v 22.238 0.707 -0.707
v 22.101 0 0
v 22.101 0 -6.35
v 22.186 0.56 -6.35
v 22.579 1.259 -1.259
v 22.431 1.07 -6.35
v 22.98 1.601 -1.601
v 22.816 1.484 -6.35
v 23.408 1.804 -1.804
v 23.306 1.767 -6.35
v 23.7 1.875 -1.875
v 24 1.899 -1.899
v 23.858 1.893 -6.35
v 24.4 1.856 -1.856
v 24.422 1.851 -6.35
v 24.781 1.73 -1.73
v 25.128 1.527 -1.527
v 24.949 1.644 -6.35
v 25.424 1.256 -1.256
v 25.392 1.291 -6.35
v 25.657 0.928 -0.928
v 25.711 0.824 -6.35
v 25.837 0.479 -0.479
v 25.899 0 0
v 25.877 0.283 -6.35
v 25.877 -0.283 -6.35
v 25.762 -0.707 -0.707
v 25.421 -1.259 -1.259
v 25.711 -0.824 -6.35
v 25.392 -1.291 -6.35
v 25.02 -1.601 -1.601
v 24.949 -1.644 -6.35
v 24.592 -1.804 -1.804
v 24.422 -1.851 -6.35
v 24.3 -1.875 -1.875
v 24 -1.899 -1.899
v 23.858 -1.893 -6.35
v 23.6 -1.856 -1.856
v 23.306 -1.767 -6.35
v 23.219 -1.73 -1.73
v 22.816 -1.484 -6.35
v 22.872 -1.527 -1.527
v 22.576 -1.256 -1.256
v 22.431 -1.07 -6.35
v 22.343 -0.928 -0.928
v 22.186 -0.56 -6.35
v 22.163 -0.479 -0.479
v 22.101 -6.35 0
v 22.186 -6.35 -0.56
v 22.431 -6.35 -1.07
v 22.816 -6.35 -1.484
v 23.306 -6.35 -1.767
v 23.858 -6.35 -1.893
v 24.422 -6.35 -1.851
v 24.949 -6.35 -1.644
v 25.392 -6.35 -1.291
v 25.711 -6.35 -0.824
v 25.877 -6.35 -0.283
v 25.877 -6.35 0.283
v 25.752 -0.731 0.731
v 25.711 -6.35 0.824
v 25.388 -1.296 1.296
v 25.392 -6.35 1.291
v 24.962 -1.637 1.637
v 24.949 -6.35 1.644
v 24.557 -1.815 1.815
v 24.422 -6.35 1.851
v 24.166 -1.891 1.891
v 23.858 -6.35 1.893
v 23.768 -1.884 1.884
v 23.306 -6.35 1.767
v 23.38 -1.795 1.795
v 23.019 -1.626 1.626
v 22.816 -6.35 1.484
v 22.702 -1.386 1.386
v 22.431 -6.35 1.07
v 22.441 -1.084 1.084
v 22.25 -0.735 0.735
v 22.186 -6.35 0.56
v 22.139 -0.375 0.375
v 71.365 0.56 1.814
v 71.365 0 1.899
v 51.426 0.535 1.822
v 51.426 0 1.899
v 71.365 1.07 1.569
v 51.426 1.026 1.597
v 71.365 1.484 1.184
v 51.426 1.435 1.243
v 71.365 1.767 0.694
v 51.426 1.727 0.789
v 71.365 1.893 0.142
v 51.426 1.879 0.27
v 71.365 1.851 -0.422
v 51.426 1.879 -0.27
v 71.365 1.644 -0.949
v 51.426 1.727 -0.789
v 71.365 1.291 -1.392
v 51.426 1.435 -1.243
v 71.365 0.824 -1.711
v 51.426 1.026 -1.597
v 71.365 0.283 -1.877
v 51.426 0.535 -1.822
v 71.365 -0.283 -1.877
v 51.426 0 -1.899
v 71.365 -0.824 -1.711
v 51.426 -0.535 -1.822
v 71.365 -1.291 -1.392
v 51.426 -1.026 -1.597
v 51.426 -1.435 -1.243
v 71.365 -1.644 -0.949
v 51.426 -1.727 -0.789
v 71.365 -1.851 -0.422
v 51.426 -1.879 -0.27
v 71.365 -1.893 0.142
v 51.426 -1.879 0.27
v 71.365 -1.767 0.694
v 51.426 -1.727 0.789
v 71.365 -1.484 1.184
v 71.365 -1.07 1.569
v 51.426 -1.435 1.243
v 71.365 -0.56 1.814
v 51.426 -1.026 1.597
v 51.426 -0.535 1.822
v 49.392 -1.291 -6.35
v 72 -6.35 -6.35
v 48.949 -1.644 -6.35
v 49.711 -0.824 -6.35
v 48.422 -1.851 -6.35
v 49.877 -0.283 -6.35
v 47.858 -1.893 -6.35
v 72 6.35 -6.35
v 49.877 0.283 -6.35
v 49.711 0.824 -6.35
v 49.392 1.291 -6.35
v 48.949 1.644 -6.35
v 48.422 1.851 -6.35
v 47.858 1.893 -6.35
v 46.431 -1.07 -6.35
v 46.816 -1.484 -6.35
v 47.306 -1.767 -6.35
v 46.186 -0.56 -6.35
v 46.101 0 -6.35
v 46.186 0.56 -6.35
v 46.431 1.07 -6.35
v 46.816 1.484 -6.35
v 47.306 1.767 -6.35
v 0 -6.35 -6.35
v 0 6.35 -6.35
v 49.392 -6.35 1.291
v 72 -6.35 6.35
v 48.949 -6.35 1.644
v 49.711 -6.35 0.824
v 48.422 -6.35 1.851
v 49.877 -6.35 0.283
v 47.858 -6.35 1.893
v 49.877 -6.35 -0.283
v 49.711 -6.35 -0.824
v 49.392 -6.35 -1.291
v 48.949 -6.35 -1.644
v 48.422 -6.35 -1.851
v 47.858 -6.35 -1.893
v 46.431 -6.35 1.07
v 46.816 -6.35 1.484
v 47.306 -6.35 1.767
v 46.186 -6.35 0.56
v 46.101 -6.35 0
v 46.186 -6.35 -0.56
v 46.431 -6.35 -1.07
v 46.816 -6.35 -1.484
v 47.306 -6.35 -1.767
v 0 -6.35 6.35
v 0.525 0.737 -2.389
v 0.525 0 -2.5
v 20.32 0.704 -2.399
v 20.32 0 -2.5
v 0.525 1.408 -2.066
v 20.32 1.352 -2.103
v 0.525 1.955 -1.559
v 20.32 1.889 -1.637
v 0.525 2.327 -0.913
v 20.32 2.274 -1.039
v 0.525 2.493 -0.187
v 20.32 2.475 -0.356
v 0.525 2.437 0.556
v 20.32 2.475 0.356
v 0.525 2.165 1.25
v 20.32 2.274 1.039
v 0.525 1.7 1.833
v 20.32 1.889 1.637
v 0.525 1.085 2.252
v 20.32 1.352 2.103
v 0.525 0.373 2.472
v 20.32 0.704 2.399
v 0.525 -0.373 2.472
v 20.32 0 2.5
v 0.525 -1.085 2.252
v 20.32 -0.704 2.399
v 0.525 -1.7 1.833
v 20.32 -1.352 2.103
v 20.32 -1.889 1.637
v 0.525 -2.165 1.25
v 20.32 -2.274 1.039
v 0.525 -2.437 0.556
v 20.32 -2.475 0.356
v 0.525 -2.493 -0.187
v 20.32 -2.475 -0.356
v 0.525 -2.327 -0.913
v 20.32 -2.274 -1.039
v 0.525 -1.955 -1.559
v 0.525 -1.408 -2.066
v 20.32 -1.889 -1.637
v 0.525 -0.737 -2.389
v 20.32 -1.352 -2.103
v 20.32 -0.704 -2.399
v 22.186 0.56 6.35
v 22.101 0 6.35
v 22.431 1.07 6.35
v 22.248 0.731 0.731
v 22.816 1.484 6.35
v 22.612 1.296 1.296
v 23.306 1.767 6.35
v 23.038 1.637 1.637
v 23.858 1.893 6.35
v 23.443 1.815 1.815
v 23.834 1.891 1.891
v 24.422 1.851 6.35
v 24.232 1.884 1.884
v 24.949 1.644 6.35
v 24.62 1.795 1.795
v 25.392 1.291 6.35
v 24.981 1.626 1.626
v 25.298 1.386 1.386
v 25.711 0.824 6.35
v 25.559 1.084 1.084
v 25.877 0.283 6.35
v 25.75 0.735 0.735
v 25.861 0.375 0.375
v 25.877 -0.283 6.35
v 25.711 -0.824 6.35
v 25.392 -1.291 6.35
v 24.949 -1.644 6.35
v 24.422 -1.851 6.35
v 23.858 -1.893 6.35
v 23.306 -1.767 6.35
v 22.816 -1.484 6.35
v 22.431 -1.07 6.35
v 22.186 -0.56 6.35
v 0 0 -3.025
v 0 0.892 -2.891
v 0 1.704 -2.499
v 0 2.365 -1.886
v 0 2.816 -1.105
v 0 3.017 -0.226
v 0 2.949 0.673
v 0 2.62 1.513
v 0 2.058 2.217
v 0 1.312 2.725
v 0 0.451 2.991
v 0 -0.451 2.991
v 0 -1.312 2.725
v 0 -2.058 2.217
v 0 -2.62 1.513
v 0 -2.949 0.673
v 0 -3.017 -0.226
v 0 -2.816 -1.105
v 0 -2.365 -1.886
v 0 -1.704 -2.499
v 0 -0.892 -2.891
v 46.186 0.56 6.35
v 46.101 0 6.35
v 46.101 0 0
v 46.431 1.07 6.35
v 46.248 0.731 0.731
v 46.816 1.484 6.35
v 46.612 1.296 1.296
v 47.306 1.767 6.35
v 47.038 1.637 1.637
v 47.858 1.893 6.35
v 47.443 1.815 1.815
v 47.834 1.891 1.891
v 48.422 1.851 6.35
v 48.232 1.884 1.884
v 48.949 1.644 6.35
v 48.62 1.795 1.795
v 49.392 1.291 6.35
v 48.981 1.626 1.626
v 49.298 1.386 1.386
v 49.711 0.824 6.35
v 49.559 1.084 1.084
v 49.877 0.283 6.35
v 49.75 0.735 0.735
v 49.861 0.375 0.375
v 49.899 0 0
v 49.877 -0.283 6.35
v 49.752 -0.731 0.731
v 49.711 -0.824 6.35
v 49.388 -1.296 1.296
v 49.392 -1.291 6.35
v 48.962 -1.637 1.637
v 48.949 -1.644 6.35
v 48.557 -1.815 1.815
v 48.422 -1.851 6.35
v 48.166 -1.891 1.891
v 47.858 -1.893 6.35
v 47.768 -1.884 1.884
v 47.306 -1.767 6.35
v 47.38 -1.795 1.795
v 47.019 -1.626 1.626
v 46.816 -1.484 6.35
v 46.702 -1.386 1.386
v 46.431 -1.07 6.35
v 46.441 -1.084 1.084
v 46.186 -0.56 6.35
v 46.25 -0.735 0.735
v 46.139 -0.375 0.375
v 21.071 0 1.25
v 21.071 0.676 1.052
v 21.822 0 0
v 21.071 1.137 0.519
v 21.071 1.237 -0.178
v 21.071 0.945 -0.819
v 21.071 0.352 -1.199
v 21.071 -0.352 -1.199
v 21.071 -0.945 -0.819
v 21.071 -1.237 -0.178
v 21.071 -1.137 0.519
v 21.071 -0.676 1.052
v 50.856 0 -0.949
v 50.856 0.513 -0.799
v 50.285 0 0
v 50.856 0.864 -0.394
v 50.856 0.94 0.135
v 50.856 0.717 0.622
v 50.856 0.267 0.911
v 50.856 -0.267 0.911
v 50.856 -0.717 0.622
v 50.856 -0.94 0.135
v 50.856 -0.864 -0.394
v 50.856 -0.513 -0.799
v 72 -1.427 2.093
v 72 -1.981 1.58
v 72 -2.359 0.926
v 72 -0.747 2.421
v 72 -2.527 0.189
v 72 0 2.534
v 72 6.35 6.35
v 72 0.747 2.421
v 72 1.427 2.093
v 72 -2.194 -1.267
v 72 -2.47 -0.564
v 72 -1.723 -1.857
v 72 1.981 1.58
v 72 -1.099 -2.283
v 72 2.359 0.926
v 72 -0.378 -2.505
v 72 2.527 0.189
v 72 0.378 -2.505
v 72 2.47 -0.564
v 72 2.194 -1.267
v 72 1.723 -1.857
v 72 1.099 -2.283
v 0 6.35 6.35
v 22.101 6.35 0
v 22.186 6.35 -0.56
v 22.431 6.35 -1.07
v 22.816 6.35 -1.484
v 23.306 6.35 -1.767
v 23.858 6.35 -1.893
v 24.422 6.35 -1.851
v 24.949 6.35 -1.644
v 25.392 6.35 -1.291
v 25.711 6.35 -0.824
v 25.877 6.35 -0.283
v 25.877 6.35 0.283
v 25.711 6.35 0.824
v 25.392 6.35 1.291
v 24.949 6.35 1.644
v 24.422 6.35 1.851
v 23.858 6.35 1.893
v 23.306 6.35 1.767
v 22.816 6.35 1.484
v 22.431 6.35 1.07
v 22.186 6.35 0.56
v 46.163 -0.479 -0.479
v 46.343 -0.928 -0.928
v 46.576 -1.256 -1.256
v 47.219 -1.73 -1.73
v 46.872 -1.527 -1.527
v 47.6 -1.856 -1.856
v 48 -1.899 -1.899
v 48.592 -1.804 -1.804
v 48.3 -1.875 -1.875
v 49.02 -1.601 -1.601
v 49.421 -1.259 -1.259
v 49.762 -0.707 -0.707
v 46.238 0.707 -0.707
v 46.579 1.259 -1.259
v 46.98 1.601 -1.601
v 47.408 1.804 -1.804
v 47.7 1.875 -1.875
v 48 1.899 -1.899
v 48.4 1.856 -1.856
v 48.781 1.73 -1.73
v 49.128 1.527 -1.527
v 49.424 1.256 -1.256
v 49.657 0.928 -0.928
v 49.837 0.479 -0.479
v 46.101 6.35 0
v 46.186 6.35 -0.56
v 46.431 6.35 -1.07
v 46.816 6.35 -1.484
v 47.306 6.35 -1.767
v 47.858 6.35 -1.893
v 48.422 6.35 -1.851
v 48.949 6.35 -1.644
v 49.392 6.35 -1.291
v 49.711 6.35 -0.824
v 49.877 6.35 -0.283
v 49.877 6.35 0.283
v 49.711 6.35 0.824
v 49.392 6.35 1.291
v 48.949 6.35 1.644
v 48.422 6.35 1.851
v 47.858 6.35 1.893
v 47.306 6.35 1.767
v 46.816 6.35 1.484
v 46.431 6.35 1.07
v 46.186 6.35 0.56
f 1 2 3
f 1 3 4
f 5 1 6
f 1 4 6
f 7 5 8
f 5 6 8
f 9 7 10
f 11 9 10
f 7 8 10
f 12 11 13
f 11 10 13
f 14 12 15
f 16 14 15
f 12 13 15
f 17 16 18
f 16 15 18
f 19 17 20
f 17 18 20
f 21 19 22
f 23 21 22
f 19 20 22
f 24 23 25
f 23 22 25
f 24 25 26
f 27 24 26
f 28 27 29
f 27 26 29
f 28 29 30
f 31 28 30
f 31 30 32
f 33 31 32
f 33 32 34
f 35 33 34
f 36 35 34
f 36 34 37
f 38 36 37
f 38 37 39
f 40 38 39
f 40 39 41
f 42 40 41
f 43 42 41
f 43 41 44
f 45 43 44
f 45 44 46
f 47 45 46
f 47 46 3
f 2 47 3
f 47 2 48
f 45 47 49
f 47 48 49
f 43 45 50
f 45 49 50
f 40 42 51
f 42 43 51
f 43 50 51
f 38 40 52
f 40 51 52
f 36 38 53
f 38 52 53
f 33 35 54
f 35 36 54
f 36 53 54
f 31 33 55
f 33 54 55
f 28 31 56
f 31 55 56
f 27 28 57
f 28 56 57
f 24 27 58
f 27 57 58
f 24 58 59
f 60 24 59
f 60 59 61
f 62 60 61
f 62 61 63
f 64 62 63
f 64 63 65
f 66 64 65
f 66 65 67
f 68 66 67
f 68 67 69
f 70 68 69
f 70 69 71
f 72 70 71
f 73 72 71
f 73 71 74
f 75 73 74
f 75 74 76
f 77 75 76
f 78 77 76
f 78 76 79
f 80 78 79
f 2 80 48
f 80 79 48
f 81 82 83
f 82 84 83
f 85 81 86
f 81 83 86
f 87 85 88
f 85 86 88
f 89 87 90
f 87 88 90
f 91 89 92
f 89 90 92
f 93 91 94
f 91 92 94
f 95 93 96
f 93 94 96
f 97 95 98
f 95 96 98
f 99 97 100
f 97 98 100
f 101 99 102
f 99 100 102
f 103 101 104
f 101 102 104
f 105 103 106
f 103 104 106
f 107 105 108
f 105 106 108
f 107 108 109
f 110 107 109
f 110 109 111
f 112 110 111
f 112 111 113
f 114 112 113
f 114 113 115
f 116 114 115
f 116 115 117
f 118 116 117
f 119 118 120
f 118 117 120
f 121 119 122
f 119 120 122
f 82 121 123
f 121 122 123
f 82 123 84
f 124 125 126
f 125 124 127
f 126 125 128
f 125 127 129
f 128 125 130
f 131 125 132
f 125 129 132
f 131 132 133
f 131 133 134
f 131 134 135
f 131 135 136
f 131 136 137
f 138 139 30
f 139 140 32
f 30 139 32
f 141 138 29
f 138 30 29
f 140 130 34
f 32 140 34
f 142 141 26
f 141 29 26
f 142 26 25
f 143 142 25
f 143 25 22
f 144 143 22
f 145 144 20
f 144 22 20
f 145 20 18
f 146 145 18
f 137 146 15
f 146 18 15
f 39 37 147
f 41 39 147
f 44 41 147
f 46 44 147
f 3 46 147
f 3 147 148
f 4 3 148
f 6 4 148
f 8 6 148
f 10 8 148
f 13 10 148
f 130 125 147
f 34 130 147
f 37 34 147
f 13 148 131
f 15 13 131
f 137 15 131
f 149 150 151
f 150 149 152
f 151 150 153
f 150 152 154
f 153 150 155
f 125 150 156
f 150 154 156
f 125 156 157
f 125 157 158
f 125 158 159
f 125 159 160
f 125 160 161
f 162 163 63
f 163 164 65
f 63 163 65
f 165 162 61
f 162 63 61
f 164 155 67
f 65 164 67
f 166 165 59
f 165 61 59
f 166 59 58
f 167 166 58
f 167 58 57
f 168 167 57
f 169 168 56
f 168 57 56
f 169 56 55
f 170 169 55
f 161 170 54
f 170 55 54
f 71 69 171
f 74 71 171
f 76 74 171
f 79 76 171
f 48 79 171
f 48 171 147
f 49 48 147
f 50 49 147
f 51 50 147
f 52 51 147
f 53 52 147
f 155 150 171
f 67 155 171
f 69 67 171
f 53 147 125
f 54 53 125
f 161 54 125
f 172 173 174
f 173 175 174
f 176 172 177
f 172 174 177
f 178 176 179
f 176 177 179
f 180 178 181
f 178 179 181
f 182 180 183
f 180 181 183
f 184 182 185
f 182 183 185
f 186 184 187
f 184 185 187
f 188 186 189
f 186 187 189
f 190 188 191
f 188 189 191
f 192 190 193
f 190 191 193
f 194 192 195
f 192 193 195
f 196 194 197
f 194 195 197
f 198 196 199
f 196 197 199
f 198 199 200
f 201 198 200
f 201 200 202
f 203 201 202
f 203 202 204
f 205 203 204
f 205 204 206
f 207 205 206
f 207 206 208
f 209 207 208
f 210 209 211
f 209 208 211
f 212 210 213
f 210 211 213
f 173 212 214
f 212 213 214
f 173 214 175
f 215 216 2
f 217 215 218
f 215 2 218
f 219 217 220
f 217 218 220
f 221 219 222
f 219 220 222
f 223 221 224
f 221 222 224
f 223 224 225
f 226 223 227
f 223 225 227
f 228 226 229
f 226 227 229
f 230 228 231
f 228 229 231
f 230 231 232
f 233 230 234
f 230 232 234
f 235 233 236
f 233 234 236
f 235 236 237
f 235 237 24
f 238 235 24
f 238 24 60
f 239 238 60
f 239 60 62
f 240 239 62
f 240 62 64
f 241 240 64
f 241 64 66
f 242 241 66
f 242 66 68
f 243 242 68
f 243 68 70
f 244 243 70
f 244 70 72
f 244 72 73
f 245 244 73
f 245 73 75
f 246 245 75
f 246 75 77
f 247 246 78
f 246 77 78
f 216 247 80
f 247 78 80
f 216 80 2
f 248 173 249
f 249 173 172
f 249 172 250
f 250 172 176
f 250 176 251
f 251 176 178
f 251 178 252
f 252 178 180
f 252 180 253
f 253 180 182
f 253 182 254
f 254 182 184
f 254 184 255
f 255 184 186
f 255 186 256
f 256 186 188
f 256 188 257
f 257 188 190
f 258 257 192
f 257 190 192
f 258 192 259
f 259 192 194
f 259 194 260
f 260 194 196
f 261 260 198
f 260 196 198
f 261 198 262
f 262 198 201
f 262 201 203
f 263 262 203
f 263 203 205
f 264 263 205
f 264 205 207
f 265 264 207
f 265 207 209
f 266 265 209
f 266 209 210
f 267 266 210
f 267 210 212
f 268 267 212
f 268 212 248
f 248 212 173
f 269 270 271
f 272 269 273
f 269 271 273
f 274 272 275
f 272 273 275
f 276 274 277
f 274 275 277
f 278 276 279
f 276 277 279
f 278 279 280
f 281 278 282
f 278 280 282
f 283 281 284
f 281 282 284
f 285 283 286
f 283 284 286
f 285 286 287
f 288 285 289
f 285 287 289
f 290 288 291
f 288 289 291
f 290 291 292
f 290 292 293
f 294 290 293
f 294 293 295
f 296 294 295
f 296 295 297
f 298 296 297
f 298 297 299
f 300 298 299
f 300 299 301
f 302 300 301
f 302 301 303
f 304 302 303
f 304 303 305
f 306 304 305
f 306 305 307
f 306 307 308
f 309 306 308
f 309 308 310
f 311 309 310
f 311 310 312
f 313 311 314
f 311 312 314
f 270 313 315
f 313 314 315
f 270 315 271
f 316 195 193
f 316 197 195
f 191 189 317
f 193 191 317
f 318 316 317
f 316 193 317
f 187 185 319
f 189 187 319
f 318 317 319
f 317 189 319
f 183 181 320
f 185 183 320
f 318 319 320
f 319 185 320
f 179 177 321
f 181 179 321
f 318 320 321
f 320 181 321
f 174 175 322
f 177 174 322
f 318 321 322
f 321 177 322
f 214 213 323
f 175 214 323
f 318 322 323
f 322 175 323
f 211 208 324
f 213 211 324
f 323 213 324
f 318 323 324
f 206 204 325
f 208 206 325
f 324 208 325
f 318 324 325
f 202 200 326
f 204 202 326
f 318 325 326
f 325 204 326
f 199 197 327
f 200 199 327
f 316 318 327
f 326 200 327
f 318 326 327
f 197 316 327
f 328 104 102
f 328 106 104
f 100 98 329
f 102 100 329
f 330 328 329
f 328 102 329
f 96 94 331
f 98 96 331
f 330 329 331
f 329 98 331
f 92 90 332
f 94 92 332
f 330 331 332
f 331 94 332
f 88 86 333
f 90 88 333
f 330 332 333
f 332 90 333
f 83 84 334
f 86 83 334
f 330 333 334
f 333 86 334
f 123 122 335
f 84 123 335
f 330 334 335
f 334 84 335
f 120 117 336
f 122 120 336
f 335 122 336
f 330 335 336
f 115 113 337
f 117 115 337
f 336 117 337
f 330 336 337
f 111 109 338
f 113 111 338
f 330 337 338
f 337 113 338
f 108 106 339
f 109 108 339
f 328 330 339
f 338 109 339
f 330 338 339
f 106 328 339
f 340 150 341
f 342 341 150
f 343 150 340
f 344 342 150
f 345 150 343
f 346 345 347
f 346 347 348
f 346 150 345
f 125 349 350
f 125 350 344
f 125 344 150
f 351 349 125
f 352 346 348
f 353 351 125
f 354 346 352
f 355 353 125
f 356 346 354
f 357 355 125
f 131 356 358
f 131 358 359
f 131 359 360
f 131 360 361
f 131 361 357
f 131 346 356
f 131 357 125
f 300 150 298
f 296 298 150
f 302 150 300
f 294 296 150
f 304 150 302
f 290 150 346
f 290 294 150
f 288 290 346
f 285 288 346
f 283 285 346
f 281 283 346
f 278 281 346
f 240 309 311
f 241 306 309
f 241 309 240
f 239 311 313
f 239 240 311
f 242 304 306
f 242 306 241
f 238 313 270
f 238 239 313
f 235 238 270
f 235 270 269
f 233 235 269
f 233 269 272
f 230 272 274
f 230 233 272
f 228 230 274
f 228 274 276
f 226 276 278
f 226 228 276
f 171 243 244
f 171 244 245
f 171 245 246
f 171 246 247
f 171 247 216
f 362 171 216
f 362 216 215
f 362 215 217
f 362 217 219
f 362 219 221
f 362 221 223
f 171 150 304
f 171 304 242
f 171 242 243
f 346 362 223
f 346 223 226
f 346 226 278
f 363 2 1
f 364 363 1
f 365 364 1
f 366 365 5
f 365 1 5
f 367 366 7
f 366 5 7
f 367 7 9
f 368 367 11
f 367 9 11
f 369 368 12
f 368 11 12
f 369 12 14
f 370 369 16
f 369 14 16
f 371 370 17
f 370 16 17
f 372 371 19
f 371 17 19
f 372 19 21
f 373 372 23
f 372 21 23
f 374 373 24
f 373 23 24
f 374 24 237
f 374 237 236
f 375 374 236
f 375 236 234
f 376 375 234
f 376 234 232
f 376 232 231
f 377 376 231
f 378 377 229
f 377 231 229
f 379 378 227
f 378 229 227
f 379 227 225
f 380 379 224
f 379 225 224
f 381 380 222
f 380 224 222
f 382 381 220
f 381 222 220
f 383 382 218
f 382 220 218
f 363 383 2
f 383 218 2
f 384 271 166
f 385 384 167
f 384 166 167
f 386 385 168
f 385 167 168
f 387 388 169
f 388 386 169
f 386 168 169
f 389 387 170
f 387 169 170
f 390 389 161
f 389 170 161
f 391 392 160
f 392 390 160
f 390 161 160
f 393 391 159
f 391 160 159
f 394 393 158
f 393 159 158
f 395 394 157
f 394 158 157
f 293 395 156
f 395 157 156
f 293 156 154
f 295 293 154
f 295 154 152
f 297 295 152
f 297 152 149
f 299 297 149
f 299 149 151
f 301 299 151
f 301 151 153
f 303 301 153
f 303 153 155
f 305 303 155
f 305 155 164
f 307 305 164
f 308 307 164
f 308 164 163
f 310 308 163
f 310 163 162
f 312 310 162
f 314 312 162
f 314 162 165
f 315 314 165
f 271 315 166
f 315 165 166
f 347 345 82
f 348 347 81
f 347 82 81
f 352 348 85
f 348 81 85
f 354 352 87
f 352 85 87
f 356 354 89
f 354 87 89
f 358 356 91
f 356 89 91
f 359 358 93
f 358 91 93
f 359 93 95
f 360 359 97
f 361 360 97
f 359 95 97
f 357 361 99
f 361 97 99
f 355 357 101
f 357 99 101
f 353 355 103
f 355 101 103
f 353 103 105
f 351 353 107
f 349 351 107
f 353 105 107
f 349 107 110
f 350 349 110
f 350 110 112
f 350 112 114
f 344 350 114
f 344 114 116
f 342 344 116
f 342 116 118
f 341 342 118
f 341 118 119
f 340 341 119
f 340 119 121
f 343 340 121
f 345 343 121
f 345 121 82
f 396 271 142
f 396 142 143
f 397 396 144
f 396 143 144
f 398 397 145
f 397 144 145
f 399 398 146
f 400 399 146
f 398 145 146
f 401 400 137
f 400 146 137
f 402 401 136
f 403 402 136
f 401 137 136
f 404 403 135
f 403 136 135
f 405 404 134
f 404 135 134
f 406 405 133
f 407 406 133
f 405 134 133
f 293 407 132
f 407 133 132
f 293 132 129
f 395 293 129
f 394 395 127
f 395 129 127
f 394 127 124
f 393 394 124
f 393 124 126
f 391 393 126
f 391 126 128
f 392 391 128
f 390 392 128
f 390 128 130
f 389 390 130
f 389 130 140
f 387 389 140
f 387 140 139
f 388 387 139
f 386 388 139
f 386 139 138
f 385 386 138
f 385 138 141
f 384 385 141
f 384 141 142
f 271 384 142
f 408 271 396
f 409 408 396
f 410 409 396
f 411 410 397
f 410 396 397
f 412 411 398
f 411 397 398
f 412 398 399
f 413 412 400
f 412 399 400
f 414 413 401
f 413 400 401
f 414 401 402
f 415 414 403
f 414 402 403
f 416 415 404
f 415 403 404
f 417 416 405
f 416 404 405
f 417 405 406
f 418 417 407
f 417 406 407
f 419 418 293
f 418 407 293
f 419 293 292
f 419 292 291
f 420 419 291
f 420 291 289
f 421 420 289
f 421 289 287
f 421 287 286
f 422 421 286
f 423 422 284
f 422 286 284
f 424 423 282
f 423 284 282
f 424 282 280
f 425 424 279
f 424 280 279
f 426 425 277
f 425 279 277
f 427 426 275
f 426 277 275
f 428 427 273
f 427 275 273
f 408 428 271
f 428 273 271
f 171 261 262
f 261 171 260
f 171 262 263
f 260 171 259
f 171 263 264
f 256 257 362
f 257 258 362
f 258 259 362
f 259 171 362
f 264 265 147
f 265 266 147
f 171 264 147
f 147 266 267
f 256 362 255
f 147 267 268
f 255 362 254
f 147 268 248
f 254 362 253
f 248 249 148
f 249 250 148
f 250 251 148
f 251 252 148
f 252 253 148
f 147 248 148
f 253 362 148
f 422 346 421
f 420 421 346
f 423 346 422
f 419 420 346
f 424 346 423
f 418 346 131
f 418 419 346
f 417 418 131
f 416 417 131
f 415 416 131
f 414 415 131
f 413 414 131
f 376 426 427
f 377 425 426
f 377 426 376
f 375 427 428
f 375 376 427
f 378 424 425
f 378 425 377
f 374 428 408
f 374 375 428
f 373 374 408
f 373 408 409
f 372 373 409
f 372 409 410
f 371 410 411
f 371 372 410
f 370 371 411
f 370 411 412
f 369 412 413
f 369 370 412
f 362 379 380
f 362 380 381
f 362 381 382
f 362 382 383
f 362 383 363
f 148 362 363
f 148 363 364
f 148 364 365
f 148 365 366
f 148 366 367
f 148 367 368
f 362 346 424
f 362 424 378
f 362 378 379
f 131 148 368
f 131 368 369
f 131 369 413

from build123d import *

# Parameters (mm, degrees)
SKETCH1_W                        = 12.7
SKETCH1_H                        = 12.7
BOSS_EXTRUDE1_DEPTH              = 72
F_10_24_TAPPED_HOLE1_D           = 3.7973
F_10_24_TAPPED_HOLE2_D           = 3.7973
M6X1_0_TAPPED_HOLE2_D            = 5
M6X1_0_TAPPED_HOLE2_DEPTH        = 20.32
M6X1_0_TAPPED_HOLE2_CSINK_D      = 6.05
M6X1_0_TAPPED_HOLE2_CSINK_ANGLE  = 90
M6X1_0_TAPPED_HOLE2_TIP          = 1.502151548
F_10_24_TAPPED_HOLE3_D           = 3.7973
F_10_24_TAPPED_HOLE3_DEPTH       = 20.574
F_10_24_TAPPED_HOLE3_CSINK_D     = 5.0673
F_10_24_TAPPED_HOLE3_CSINK_ANGLE = 90
F_10_24_TAPPED_HOLE3_TIP         = 1.140824014
LPATTERN1_COUNT                  = 2
LPATTERN1_PITCH                  = 24
LPATTERN2_COUNT                  = 2
LPATTERN2_PITCH                  = 24


with BuildPart() as part:
    # Sketch1 → Boss-Extrude1 (new body)
    with BuildSketch(Plane(origin=(0, 0, 0), x_dir=(0, 0, -1), z_dir=(1, 0, 0))):
        Rectangle(SKETCH1_W, SKETCH1_H)
    extrude(amount=BOSS_EXTRUDE1_DEPTH)

    # #10-24 Tapped Hole1 (through all)
    with Locations(Plane.XY.offset(6.35)):
        with Locations((24, 0)):
            f_10_24_tapped_hole1 = Hole(F_10_24_TAPPED_HOLE1_D / 2)

    # #10-24 Tapped Hole2 (through all)
    with Locations(Plane(origin=(0, 6.35, 0), x_dir=(1, 0, 0), z_dir=(0, 1, 0))):
        with Locations((24, 0)):
            f_10_24_tapped_hole2 = Hole(F_10_24_TAPPED_HOLE2_D / 2)

    # M6x1.0 Tapped Hole2
    with Locations(Plane.ZY):
        with Locations((0, 0)):
            CounterSinkHole(M6X1_0_TAPPED_HOLE2_D / 2, M6X1_0_TAPPED_HOLE2_CSINK_D / 2, depth=M6X1_0_TAPPED_HOLE2_DEPTH, counter_sink_angle=M6X1_0_TAPPED_HOLE2_CSINK_ANGLE)
            with Locations((0, 0, -(M6X1_0_TAPPED_HOLE2_DEPTH + M6X1_0_TAPPED_HOLE2_TIP / 2))):  # 118° drill point
                Cone(0, M6X1_0_TAPPED_HOLE2_D / 2, M6X1_0_TAPPED_HOLE2_TIP, mode=Mode.SUBTRACT)

    # #10-24 Tapped Hole3
    with Locations(Plane(origin=(72, 0, 0), x_dir=(0, 0, -1), z_dir=(1, 0, 0))):
        with Locations((0, 0)):
            CounterSinkHole(F_10_24_TAPPED_HOLE3_D / 2, F_10_24_TAPPED_HOLE3_CSINK_D / 2, depth=F_10_24_TAPPED_HOLE3_DEPTH, counter_sink_angle=F_10_24_TAPPED_HOLE3_CSINK_ANGLE)
            with Locations((0, 0, -(F_10_24_TAPPED_HOLE3_DEPTH + F_10_24_TAPPED_HOLE3_TIP / 2))):  # 118° drill point
                Cone(0, F_10_24_TAPPED_HOLE3_D / 2, F_10_24_TAPPED_HOLE3_TIP, mode=Mode.SUBTRACT)

    # LPattern1: #10-24 Tapped Hole1 ×2
    with Locations(*[(i * LPATTERN1_PITCH, 0, 0) for i in range(1, LPATTERN1_COUNT)]):
        add(f_10_24_tapped_hole1, mode=Mode.SUBTRACT)

    # LPattern2: #10-24 Tapped Hole2 ×2
    with Locations(*[(i * LPATTERN2_PITCH, 0, 0) for i in range(1, LPATTERN2_COUNT)]):
        add(f_10_24_tapped_hole2, mode=Mode.SUBTRACT)


solid = part.part
